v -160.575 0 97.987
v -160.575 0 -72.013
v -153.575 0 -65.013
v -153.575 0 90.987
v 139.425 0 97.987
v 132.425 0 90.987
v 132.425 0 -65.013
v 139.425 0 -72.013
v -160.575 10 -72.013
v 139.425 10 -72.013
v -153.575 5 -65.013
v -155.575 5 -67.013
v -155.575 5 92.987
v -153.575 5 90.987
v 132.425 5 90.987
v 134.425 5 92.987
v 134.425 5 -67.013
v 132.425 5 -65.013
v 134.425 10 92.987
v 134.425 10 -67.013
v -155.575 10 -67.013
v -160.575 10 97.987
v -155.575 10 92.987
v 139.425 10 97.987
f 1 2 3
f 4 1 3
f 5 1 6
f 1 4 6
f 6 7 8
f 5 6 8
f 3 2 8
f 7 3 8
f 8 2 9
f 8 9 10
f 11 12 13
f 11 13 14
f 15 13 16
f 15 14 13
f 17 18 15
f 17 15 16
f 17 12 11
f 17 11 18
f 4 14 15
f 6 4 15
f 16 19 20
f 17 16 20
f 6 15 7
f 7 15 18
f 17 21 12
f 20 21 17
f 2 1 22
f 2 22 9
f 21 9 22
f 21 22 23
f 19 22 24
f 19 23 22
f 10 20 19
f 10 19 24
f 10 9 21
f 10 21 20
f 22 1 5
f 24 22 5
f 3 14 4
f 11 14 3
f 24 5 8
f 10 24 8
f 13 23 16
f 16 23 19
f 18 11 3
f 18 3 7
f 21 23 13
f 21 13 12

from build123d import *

# Parameters (mm, degrees)
SKETCH1_W               = 300
SKETCH1_H               = 170
BOSS_EXTRUDE1_DEPTH     = 10
SKETCH2_W               = 290
SKETCH2_H               = 160
SKETCH2_W_2             = 286
SKETCH2_H_2             = 156
CUT_EXTRUDE1_DEPTH      = 5
SKETCH5_W               = 286
SKETCH5_H               = 156
CUT_EXTRUDE2_DEPTH      = 28
CUT_EXTRUDE2_DEPTH_BACK = 40


with BuildPart() as part:
    # Sketch1 → Boss-Extrude1 (new body)
    with BuildSketch(Plane(origin=(0, 0, 0), x_dir=(1, 0, 0), z_dir=(0, 1, 0))):
        with Locations((-10.575275385, -12.987279515)):
            Rectangle(SKETCH1_W, SKETCH1_H)
    extrude(amount=BOSS_EXTRUDE1_DEPTH)

    # Sketch2 → Cut-Extrude1 (cut)
    with BuildSketch(Plane(origin=(0, 10, 0), x_dir=(1, 0, 0), z_dir=(0, 1, 0))):
        with Locations((-10.575275385, -12.987279515)):
            Rectangle(SKETCH2_W, SKETCH2_H)
        with Locations((-10.575275385, -12.987279515)):
            Rectangle(SKETCH2_W_2, SKETCH2_H_2, mode=Mode.SUBTRACT)
    extrude(amount=-CUT_EXTRUDE1_DEPTH, mode=Mode.SUBTRACT)

    # Sketch5 → Cut-Extrude2 (cut, two sides)
    with BuildSketch(Plane(origin=(0, 10, 0), x_dir=(1, 0, 0), z_dir=(0, 1, 0))) as cut_extrude2_sk:
        with Locations((-10.575275385, -12.987279515)):
            Rectangle(SKETCH5_W, SKETCH5_H)
    extrude(amount=CUT_EXTRUDE2_DEPTH, mode=Mode.SUBTRACT)
    extrude(cut_extrude2_sk.sketch, amount=-CUT_EXTRUDE2_DEPTH_BACK, mode=Mode.SUBTRACT)


solid = part.part
